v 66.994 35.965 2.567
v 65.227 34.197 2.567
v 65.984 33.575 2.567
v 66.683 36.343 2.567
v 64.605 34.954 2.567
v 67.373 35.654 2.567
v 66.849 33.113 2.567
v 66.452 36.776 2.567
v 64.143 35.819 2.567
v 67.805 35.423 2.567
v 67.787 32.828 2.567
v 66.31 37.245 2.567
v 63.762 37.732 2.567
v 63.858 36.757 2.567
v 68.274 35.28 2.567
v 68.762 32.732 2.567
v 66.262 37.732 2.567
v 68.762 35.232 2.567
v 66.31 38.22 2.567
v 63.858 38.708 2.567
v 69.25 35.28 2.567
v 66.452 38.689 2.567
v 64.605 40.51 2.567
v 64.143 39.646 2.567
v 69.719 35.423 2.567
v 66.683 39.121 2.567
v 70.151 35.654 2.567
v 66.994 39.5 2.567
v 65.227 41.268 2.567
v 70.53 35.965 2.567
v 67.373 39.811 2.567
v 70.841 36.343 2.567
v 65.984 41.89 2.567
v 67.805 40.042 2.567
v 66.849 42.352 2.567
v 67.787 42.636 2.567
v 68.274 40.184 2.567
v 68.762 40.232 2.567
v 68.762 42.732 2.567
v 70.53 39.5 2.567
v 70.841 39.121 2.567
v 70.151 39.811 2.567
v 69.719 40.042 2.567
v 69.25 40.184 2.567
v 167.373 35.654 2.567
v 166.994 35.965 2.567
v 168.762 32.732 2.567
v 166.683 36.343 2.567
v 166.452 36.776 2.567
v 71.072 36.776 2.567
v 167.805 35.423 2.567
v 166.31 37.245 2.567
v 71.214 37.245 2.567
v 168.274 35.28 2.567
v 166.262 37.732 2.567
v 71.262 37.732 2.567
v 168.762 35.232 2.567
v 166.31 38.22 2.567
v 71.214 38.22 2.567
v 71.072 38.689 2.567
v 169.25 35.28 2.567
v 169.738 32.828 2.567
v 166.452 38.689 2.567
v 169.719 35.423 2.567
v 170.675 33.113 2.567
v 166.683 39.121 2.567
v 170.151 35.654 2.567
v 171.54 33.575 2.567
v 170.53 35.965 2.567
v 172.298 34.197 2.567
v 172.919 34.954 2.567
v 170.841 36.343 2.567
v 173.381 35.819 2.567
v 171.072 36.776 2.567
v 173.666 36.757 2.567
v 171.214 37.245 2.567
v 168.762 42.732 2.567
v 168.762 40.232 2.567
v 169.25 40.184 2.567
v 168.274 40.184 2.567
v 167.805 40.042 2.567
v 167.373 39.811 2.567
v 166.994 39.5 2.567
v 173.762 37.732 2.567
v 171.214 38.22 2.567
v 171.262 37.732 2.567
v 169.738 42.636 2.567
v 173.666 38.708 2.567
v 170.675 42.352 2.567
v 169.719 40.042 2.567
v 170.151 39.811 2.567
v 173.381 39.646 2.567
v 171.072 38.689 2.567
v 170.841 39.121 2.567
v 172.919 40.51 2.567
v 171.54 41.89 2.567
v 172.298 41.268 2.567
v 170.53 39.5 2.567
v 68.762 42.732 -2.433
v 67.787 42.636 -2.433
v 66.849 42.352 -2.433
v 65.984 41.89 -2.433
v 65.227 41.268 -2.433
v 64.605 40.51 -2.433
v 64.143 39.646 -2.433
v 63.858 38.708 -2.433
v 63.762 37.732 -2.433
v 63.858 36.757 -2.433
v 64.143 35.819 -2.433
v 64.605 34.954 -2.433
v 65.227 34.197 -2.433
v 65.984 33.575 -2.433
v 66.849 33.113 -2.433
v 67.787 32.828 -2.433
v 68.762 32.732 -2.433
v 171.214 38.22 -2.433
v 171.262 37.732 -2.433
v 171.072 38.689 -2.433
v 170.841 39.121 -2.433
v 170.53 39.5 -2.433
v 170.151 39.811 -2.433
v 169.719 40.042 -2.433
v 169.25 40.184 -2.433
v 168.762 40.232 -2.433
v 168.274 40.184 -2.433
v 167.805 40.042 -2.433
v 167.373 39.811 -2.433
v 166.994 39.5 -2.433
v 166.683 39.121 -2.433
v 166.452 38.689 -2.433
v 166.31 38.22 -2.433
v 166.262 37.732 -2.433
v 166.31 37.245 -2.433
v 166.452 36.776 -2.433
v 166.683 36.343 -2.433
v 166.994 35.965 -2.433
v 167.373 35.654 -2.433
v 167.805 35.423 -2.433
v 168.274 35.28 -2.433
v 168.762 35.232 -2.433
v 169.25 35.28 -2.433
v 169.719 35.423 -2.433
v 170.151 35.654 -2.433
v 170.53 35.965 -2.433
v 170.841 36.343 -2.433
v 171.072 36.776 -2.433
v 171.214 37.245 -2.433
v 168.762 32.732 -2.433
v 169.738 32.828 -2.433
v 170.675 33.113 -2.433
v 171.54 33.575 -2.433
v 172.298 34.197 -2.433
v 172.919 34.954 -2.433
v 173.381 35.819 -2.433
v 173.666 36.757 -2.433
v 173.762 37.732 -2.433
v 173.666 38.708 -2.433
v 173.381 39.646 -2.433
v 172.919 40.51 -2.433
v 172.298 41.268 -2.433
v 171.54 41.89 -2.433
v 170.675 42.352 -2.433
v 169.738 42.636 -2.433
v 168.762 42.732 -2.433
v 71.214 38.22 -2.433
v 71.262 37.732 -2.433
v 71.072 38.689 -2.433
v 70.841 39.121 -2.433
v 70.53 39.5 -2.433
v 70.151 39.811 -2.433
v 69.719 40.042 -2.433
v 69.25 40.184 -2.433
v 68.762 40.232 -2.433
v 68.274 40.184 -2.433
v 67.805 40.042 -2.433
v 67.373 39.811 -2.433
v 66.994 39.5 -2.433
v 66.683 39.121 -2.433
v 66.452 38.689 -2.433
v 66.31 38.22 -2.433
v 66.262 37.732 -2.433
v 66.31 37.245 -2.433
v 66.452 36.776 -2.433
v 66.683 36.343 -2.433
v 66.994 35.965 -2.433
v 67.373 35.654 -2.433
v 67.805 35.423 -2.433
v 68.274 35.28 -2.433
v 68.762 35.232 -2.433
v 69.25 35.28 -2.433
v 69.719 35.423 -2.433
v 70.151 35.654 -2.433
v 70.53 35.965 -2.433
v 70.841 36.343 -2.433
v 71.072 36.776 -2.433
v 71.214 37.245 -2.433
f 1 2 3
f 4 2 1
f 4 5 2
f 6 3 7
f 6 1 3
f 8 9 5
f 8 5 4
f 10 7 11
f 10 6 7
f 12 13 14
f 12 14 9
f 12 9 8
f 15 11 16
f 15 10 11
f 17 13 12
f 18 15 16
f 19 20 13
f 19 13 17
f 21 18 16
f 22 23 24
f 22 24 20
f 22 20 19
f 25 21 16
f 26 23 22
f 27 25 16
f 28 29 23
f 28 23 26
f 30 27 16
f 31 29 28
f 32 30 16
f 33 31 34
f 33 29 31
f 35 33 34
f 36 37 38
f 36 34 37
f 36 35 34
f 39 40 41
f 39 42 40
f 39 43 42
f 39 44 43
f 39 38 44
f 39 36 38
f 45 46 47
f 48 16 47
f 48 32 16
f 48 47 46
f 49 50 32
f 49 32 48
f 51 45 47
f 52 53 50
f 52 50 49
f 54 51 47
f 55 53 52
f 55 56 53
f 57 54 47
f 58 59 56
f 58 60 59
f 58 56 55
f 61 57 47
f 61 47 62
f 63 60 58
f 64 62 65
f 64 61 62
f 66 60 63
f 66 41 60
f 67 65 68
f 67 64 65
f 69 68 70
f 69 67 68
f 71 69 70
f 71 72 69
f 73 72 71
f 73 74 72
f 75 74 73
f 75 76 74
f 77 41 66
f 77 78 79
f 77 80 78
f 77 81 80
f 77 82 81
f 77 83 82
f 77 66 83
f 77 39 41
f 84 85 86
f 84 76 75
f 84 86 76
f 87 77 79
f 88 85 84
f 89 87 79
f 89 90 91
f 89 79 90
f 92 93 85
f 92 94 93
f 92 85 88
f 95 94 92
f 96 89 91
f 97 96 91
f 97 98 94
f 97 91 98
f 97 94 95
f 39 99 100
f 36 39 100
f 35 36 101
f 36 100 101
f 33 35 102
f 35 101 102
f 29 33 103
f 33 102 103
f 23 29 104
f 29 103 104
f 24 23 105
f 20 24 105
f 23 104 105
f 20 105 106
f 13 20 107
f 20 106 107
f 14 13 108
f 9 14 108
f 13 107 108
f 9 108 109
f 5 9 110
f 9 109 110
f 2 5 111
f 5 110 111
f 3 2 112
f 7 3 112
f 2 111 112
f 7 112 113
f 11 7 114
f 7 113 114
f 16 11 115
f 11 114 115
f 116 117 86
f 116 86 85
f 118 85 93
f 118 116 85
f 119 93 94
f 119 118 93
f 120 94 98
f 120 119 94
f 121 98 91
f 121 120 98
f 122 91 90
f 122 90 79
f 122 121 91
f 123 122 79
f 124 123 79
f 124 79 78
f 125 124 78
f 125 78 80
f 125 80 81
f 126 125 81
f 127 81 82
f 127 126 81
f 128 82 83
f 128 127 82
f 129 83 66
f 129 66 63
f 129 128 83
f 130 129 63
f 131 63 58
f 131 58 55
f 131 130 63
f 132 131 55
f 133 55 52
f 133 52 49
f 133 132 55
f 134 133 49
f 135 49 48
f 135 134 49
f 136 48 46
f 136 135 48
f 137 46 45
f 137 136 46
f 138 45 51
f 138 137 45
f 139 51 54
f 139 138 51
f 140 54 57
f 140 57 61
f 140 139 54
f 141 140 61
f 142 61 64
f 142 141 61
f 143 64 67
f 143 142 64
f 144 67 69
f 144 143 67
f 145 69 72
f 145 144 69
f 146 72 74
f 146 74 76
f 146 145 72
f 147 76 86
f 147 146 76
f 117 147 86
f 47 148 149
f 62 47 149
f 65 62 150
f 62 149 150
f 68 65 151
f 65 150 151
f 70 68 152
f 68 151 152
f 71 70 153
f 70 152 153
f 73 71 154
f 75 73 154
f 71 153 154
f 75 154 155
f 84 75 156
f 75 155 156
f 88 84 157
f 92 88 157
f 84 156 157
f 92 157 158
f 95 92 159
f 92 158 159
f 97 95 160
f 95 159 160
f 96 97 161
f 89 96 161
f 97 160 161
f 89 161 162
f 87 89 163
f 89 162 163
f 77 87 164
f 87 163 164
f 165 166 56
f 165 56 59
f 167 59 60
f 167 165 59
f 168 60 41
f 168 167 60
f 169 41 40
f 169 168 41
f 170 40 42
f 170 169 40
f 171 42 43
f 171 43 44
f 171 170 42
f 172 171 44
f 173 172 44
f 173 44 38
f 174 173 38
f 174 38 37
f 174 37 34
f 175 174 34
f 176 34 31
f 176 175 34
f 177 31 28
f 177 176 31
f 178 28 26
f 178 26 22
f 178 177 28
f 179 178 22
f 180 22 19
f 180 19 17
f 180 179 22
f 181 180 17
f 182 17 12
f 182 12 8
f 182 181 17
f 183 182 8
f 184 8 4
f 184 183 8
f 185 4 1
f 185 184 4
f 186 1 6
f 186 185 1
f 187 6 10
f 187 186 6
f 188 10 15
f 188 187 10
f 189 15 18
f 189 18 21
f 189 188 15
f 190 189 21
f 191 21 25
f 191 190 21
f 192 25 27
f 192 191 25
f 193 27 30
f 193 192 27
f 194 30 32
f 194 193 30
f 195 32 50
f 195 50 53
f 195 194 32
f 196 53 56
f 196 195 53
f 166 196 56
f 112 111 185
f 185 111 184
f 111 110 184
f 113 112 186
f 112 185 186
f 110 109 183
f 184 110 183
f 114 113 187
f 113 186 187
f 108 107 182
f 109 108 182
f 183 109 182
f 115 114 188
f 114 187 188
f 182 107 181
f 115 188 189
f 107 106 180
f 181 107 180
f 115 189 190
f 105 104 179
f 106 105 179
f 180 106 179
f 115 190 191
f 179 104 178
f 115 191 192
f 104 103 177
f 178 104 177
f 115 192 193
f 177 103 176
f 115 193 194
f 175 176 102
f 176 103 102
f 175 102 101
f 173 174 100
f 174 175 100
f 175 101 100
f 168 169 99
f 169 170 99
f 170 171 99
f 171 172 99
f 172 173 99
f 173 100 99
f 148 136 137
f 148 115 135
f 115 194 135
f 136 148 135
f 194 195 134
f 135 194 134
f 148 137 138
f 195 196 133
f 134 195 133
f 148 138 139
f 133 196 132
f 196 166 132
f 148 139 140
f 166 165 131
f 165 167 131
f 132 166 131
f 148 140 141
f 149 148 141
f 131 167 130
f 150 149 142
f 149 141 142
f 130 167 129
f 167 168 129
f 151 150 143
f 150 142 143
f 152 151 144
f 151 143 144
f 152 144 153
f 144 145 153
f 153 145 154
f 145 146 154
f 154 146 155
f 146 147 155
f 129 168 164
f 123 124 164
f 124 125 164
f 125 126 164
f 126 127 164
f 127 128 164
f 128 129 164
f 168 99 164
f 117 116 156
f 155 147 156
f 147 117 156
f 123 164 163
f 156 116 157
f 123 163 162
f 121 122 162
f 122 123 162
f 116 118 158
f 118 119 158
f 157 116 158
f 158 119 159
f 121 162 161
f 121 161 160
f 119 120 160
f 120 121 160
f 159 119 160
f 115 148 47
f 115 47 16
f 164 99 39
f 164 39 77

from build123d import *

# Parameters (mm, degrees)
SKETCH_R      = 2.5
EXTRUDE_DEPTH = 5


with BuildPart() as part:
    # Sketch → Extrude (new body)
    with BuildSketch(Plane.XY):
        with BuildLine():
            ThreePointArc((0, 5), (-5, 0), (0, -5))
            Line((100, -5), (0, -5))
            ThreePointArc((100, -5), (105, 0), (100, 5))
            Line((0, 5), (100, 5))
        make_face()
        Circle(SKETCH_R, mode=Mode.SUBTRACT)
        with Locations((100, 0)):
            Circle(SKETCH_R, mode=Mode.SUBTRACT)
    extrude(amount=EXTRUDE_DEPTH)


with BuildPart() as part_1:
    # Extrude placement: moved
    add(part.part.moved(Location((68.762068, 37.732329, -2.433251))))


solid = part_1.part
